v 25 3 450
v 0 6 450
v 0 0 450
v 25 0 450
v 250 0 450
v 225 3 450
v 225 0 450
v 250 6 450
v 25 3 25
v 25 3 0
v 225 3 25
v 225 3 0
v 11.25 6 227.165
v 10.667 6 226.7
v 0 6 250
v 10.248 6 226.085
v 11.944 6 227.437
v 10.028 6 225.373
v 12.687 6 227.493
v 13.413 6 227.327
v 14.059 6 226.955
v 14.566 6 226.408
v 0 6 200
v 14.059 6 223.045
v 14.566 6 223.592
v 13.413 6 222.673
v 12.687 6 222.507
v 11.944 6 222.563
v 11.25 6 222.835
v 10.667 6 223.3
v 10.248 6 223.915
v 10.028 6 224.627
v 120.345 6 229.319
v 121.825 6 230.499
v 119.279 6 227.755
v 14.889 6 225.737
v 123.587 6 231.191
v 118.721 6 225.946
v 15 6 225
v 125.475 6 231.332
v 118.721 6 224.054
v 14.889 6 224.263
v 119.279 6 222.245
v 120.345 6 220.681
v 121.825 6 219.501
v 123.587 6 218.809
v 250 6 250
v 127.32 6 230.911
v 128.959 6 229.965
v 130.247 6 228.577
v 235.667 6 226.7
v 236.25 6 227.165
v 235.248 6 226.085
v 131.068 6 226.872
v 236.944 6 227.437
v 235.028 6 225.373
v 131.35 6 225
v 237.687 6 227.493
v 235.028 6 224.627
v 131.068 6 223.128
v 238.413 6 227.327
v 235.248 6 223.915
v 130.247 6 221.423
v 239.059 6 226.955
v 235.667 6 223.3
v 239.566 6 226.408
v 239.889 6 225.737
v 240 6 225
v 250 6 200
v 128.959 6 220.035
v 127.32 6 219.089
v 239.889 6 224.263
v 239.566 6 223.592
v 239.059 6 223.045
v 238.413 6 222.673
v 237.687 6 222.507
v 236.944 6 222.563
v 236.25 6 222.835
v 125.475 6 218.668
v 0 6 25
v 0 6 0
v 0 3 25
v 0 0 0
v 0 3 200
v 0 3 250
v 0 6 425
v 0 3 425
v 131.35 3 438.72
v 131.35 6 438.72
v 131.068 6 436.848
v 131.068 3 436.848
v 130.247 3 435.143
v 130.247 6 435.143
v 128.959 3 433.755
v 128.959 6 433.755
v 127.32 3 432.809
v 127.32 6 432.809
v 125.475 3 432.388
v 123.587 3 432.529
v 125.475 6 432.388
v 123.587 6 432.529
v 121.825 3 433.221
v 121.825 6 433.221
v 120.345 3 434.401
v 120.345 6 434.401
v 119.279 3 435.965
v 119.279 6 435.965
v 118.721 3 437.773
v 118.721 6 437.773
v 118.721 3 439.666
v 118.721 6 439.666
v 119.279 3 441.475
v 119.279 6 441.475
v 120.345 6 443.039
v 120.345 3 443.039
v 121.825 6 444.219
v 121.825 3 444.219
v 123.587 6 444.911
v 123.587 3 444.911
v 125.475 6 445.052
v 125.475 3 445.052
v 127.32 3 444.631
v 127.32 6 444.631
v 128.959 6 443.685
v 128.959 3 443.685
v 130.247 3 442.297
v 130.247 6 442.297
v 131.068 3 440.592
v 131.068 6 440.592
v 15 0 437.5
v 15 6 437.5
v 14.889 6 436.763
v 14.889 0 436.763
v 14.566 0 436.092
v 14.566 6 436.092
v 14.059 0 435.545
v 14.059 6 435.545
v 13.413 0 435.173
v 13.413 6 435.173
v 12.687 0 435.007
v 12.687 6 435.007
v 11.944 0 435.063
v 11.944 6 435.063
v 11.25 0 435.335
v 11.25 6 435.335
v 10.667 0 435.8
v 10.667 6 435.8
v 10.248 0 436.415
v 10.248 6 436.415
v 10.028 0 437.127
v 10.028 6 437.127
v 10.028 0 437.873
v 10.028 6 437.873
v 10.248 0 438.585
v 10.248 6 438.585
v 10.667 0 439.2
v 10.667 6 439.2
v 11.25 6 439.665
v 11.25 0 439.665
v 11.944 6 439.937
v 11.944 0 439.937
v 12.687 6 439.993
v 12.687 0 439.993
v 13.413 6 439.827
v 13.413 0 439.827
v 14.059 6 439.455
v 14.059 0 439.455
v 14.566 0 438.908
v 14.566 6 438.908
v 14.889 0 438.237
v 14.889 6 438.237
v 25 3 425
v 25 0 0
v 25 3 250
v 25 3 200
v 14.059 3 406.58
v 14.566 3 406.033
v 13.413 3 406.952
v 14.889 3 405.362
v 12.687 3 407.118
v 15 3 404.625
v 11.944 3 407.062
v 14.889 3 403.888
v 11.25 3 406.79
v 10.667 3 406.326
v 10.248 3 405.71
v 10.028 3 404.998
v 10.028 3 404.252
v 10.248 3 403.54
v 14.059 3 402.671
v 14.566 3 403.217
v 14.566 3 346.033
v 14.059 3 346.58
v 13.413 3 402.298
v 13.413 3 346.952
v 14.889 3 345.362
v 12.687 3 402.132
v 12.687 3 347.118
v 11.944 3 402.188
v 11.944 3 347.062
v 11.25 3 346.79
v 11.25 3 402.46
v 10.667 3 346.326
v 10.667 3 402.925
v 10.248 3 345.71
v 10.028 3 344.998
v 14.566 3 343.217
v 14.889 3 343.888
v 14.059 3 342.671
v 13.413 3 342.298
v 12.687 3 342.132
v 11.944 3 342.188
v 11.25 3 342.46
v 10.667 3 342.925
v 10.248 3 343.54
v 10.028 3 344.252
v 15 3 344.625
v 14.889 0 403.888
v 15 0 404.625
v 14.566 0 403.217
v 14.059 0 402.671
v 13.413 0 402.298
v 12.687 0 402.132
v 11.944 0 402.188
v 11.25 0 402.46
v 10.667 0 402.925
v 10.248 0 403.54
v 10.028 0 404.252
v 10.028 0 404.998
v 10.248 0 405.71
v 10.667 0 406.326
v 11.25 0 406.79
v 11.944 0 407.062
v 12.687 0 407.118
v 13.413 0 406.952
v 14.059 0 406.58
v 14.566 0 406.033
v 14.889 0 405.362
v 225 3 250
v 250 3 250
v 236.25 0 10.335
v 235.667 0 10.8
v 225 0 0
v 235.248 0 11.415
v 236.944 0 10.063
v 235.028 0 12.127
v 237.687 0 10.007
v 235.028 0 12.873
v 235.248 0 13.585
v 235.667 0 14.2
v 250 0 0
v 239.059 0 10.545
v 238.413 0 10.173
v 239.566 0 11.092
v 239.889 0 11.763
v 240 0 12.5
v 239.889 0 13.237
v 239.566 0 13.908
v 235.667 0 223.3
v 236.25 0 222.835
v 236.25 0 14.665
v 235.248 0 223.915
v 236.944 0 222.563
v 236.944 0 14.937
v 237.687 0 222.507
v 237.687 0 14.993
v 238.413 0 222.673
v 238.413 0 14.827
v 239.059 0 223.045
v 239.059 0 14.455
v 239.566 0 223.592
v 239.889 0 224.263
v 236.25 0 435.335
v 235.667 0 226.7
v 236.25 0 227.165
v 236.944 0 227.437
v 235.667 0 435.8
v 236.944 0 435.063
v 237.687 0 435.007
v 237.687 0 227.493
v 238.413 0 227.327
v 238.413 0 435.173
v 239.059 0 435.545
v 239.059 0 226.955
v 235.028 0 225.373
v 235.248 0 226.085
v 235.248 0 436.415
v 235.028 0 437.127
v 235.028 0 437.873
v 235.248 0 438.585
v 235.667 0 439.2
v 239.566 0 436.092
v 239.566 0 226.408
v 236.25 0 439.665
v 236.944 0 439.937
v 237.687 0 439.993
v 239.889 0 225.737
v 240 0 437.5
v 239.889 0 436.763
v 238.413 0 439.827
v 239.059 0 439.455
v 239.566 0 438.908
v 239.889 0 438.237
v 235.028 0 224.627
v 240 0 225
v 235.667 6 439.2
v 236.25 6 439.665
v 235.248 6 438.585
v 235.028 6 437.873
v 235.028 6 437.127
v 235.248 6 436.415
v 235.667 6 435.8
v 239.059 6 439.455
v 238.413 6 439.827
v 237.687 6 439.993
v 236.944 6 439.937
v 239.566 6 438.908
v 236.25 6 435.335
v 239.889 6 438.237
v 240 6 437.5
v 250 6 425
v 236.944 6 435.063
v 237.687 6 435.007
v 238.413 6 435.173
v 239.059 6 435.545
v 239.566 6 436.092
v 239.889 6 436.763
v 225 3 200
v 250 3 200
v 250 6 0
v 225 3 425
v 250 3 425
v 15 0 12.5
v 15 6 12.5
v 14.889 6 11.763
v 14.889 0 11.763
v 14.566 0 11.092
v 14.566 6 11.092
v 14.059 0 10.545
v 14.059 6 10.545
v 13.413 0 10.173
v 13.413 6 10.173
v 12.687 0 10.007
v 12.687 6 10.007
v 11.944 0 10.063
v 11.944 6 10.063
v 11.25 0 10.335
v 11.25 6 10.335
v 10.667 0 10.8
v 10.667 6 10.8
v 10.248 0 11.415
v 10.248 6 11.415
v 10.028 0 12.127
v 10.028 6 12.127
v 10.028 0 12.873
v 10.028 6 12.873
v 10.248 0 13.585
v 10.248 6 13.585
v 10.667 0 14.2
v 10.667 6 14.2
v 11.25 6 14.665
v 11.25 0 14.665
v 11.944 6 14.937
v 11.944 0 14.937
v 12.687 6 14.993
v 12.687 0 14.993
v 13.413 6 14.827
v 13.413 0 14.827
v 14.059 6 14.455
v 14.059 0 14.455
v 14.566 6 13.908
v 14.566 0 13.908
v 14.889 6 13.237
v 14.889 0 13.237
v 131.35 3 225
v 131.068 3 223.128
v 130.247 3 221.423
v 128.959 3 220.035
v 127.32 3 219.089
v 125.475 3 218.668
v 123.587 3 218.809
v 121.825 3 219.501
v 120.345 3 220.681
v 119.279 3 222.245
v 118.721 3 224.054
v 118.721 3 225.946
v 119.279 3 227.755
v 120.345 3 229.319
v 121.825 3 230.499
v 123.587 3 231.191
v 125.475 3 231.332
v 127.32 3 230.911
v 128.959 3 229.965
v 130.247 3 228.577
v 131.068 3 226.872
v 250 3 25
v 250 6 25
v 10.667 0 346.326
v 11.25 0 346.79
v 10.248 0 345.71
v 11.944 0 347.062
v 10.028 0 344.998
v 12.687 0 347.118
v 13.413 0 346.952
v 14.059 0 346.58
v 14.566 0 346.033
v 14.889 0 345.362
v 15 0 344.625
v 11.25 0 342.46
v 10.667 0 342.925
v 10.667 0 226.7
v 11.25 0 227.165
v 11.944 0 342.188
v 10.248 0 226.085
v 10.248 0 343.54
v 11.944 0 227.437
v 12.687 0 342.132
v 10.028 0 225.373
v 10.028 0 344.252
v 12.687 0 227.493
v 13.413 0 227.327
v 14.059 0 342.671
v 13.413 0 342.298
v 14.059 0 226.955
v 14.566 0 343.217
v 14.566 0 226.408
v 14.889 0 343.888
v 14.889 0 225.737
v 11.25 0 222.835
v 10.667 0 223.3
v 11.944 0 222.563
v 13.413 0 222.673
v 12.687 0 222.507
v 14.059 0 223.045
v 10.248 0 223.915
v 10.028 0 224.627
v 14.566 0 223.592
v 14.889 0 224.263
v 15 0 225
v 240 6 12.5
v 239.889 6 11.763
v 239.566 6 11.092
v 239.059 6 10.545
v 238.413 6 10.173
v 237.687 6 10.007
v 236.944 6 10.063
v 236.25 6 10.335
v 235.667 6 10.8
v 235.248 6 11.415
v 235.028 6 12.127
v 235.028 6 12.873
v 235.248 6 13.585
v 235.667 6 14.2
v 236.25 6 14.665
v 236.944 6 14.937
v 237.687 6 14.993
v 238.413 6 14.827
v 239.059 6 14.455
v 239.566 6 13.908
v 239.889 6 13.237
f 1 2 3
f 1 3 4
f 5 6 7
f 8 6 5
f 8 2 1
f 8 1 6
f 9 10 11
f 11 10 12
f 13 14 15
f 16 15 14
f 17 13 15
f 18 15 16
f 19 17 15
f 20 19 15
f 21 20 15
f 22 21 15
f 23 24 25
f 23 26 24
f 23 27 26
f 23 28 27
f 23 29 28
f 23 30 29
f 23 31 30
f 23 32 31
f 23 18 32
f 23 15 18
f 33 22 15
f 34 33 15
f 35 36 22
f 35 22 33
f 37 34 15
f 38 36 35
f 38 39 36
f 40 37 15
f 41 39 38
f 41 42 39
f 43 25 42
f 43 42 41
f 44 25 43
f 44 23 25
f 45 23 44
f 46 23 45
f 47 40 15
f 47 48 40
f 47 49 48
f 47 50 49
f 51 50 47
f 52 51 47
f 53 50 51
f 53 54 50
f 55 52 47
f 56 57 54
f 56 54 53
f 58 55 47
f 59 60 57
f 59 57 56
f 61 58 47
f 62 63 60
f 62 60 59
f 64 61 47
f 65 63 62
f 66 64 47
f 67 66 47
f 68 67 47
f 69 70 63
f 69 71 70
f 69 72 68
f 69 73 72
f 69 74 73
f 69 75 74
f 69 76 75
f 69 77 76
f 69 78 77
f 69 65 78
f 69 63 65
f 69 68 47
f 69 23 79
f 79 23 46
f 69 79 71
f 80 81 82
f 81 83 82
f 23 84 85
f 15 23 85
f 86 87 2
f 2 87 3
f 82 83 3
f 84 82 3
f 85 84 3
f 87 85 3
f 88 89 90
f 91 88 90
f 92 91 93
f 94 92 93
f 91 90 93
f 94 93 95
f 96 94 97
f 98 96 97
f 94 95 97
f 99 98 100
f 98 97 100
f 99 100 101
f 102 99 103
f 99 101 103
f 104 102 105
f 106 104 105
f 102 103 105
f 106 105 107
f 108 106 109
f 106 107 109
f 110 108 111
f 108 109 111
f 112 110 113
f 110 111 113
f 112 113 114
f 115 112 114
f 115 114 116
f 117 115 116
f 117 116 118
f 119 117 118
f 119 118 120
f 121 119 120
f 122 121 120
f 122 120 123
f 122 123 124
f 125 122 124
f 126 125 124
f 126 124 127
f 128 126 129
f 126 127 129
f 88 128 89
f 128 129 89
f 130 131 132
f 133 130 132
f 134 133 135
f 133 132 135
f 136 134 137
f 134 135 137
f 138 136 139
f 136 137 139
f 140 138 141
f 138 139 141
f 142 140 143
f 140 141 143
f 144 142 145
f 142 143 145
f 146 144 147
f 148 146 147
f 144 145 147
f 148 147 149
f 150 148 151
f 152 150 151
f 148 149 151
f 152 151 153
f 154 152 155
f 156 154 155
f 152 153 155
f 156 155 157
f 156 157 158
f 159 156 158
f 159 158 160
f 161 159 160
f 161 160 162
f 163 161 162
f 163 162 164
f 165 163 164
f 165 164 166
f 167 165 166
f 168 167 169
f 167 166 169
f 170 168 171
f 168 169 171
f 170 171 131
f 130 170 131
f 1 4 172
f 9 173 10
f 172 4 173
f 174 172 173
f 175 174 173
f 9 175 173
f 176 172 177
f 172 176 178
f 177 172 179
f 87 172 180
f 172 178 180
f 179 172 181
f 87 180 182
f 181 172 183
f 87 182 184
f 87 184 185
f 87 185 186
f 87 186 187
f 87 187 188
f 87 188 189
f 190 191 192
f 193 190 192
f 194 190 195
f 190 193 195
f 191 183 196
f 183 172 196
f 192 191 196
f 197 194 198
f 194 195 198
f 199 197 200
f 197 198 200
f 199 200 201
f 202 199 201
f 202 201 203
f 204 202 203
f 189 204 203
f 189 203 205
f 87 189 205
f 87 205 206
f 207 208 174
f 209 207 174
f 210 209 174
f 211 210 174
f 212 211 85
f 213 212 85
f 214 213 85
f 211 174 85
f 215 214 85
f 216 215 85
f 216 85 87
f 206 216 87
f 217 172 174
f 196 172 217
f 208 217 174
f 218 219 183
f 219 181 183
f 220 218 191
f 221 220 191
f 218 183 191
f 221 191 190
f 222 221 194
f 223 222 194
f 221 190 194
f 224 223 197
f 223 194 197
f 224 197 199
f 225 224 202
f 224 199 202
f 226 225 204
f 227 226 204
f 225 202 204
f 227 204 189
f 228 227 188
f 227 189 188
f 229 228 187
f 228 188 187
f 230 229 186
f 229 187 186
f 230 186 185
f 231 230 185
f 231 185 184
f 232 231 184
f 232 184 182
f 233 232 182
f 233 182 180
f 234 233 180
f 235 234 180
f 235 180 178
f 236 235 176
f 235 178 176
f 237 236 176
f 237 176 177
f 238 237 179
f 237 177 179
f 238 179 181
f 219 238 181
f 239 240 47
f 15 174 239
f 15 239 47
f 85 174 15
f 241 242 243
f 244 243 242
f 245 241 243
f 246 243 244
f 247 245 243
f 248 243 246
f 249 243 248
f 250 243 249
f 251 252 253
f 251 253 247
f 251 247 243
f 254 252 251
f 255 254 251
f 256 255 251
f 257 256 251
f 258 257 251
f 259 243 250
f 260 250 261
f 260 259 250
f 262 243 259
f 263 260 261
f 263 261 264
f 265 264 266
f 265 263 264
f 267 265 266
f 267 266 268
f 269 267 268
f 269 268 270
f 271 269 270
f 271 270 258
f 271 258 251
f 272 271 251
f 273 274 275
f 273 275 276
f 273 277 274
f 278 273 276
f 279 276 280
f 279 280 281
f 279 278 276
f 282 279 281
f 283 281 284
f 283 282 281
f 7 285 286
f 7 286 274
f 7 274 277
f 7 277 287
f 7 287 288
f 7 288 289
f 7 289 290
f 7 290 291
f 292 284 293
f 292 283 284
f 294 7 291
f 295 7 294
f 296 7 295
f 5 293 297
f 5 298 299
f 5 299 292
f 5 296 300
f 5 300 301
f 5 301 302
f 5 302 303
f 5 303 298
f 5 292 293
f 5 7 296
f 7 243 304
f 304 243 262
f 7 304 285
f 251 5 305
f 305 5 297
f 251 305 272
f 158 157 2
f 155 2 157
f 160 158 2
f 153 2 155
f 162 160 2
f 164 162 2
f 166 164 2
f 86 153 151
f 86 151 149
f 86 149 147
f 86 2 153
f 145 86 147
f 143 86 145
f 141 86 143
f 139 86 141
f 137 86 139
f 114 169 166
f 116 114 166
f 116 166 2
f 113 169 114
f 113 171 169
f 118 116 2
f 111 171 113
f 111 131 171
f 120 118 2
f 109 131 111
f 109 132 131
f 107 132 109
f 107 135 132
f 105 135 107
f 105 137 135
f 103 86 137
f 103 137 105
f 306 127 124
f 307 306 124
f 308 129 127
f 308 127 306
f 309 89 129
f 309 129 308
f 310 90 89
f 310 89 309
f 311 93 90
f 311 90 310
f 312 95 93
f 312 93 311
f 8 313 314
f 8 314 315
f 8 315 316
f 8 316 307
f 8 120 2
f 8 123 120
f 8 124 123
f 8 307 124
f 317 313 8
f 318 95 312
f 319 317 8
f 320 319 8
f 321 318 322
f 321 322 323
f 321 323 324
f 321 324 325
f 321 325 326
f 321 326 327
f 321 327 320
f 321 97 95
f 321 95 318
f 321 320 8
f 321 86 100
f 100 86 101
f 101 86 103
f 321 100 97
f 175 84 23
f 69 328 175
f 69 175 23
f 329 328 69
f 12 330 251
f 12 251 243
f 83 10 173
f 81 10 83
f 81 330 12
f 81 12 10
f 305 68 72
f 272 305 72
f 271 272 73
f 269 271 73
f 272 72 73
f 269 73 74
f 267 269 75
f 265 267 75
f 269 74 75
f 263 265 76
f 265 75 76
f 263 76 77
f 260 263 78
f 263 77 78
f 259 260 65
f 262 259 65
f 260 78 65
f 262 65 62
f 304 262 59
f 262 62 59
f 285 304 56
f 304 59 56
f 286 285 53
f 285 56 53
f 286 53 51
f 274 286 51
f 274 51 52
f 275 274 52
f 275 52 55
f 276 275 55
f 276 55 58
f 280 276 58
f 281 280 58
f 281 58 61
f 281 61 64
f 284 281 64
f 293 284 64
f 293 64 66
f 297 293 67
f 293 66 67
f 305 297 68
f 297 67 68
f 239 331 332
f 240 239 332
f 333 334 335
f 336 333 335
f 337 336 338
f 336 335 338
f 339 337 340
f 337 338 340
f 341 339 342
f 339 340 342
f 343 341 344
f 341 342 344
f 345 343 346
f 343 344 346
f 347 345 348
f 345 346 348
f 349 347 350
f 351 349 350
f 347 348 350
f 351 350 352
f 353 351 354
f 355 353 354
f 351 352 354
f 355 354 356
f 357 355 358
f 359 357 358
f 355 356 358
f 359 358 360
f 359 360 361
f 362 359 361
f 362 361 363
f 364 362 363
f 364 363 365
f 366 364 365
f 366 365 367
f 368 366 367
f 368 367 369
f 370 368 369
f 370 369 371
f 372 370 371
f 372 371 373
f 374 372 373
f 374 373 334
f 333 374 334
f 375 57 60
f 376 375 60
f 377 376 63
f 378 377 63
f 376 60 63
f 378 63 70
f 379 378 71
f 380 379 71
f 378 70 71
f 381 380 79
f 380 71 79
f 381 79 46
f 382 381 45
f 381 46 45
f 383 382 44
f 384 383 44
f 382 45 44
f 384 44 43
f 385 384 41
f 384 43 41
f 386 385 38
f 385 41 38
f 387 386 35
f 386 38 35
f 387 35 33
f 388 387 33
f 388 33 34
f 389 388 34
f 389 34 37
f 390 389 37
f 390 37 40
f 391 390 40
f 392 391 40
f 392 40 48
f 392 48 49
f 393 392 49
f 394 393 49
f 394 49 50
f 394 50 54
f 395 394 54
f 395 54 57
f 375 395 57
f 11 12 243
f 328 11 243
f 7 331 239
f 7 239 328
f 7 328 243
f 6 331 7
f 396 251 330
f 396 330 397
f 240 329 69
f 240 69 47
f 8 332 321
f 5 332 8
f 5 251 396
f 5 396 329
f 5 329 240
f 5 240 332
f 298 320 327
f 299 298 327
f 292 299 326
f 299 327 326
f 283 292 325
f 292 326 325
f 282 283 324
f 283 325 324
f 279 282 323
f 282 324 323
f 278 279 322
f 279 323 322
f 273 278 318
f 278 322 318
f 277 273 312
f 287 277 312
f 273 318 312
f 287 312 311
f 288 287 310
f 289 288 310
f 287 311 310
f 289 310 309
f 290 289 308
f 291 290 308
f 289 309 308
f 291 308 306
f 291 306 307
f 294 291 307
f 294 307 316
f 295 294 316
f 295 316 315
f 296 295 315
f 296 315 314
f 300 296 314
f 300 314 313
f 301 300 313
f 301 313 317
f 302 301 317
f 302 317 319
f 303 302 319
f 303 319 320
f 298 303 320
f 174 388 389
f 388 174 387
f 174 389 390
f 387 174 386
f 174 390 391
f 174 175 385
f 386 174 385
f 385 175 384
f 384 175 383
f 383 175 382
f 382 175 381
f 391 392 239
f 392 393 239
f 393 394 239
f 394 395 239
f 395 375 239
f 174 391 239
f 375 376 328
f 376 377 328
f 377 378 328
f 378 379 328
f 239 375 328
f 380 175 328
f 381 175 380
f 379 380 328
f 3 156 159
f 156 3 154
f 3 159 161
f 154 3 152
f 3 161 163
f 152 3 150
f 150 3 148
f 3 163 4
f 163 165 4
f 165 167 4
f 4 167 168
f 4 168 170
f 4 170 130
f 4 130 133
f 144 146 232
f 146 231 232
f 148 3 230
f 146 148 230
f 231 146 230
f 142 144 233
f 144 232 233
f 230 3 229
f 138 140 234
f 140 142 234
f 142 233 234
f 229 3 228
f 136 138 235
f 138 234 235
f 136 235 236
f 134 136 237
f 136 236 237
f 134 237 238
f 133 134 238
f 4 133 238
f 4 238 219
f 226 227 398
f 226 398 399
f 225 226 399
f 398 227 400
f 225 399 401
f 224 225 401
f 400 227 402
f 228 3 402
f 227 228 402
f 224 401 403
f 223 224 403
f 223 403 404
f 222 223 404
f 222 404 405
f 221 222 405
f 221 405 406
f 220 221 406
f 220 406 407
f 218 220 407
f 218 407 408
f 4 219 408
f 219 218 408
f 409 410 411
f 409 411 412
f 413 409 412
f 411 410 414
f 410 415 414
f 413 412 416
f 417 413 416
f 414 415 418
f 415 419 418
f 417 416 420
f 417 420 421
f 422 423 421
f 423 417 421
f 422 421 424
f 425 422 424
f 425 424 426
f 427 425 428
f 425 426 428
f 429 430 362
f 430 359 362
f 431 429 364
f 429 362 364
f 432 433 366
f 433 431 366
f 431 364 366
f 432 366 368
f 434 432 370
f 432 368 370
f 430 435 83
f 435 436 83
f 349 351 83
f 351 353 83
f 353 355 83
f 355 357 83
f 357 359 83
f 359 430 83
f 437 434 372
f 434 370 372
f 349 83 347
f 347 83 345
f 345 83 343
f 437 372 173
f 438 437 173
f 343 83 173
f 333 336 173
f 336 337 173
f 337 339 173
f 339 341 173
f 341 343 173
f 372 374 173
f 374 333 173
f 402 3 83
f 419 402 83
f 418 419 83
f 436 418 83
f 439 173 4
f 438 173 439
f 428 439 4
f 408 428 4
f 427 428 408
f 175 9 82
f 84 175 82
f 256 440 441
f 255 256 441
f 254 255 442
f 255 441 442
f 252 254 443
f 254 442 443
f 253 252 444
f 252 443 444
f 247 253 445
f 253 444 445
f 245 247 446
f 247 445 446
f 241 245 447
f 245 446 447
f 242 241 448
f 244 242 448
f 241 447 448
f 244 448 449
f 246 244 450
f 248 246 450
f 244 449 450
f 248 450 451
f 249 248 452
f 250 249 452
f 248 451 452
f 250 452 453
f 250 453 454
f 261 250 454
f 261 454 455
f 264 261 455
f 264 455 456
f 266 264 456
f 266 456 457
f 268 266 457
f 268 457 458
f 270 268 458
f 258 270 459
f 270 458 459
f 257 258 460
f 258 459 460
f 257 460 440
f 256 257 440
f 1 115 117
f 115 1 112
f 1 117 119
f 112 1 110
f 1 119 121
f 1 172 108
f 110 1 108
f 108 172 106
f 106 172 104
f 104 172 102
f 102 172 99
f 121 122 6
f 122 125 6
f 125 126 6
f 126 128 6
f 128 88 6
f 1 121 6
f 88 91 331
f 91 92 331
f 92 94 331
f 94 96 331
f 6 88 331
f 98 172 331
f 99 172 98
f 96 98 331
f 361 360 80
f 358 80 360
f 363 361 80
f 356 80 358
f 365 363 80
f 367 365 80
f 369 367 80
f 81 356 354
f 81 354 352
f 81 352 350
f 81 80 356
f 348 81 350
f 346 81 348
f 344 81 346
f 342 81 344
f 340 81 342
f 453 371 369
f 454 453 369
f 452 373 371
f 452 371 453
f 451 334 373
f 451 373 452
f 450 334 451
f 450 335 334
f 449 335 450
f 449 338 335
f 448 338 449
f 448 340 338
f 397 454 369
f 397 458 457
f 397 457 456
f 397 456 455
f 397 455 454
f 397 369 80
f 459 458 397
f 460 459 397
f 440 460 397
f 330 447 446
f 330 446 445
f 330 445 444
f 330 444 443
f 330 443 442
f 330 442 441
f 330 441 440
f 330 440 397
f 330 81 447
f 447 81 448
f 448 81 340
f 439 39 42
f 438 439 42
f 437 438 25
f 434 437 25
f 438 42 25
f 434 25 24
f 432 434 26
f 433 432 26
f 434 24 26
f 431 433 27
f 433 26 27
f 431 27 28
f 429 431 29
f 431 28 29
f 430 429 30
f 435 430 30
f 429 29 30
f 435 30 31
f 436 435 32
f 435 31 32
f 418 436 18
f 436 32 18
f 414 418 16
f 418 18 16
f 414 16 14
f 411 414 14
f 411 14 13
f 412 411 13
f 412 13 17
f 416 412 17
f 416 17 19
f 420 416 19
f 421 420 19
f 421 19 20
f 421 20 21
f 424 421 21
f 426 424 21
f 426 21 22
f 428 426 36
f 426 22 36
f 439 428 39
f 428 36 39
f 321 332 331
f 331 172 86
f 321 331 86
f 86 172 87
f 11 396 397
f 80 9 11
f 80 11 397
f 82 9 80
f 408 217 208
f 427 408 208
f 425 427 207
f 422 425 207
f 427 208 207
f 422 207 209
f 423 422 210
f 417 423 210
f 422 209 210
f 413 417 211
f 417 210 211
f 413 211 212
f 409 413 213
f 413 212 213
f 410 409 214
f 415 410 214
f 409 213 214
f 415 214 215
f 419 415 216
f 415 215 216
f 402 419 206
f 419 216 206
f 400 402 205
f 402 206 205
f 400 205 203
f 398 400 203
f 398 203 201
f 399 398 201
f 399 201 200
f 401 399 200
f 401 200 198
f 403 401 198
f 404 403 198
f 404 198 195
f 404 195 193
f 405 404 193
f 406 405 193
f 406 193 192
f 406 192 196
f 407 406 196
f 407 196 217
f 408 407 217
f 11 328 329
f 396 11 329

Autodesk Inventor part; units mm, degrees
ref_plane "YZ Plane" through (0, 0, 0) normal (1, 0, 0) x (0, 1, 0)
ref_plane "XZ Plane" through (0, 0, 0) normal (0, 1, 0) x (-1, 0, 0)
ref_plane "XY Plane" through (0, 0, 0) normal (0, 0, 1) x (1, 0, 0)
sketch "Sketch1" plane through (0, 0, 0) normal (0, 0, 1) x (1, 0, 0)
  line L0 (0, 0) -> (25, 0)
  line L1 (25, 0) -> (25, 3)
  line L2 (25, 3) -> (0, 3)
  line L3 (0, 3) -> (0, 0)
  dimension "d0" = 25
  dimension "d1" = 3
extrude "Extrusion1" add sketch "Sketch1" along normal blind 450
sketch "Sketch2" plane through (0, 3, 0) normal (0, 1, 0) x (1, 0, 0)
  line L0 (0, 0) -> (0, -450) projected
  line L1 (0, 0) -> (250, 0)
  line L2 (250, 0) -> (250, -25)
  line L3 (250, -25) -> (0, -25)
  line L4 (0, -25) -> (0, 0)
  dimension "d4" = 250
  dimension "d5" = 25
extrude "Extrusion2" add sketch "Sketch2" along normal blind 3
sketch "Sketch3" plane through (0, 3, 450) normal (0, 1, 0) x (1, 0, 0)
  line L0 (0, 450) -> (0, 0) projected
  line L1 (0, 0) -> (250, 0)
  line L2 (250, 0) -> (250, 25)
  line L3 (250, 25) -> (0, 25)
  line L4 (0, 25) -> (0, 0)
  dimension "d8" = 250
  dimension "d9" = 25
extrude "Extrusion3" add sketch "Sketch3" along normal blind 3
sketch "Sketch4" plane through (0, 3, 0) normal (0, -1, 0) x (1, 0, 0)
  line L0 (250, 0) -> (0, 0) projected
  line L1 (250, 0) -> (225, 0)
  line L2 (225, 0) -> (225, 450)
  line L3 (225, 450) -> (250, 450)
  line L4 (250, 450) -> (250, 0)
  dimension "d12" = 25
  dimension "d13" = 450
extrude "Extrusion4" add sketch "Sketch4" along normal blind 3
sketch "Sketch5" plane through (0, 3, 25) normal (0, 1, 0) x (1, 0, 0)
  line L0 (0, 25) -> (0, -175)
  line L1 (0, 0) -> (0, -400) projected
  line L2 (0, -175) -> (250, -175)
  line L3 (250, -175) -> (250, -225)
  line L4 (250, -225) -> (0, -225)
  line L5 (0, -225) -> (0, -175)
  dimension "d16" = 200
  dimension "d17" = 250
  dimension "d18" = 50
extrude "Extrusion5" add sketch "Sketch5" along normal blind 3
sketch "Sketch6" plane through (0, 6, 0) normal (0, 1, 0) x (1, 0, 0)
  line L0 (25, -25) -> (0, -25) projected
  line L1 (0, 0) -> (0, -25) projected
  line L2 (25, -25) -> (0, -25)
  line L3 (0, -25) -> (0, 0)
  line L4 (0, 0) -> (25, 0)
  line L5 (25, 0) -> (25, -25)
  line L6 (25, -25) -> (0, 0)
  line L7 (225, 0) -> (25, 0) projected
  line L8 (25, 0) -> (0, -25)
  circle A0 centre (12.5, -12.5) radius 2.5
  line L9 (0, -450) -> (250, -450) projected
  line L10 (250, -425) -> (0, -425) projected
  line L11 (0, -450) -> (25, -450)
  line L12 (25, -450) -> (25, -425)
  line L13 (25, -425) -> (0, -425)
  line L14 (0, -425) -> (0, -450)
  line L15 (250, -450) -> (225, -450)
  line L16 (225, -450) -> (225, -425)
  line L17 (225, -425) -> (250, -425)
  line L18 (250, -425) -> (250, -450)
  line L19 (0, -450) -> (25, -425)
  line L20 (25, -450) -> (0, -425)
  line L21 (250, -450) -> (225, -425)
  line L22 (225, -425) -> (225, -250) projected
  line L23 (225, -450) -> (250, -425)
  circle A1 centre (237.5, -437.5) radius 2.5
  circle A2 centre (12.5, -437.5) radius 2.5
  line L24 (250, -25) -> (250, 0) projected
  line L25 (225, -25) -> (250, -25) projected
  line L26 (250, 0) -> (225, 0)
  line L27 (225, 0) -> (225, -25)
  line L28 (225, -25) -> (250, -25)
  line L29 (250, -25) -> (250, 0)
  line L30 (250, -25) -> (225, 0)
  line L31 (225, 0) -> (225, -25) projected
  line L32 (225, 0) -> (225, -25)
  line L33 (225, -25) -> (250, 0)
  circle A3 centre (237.5, -12.5) radius 2.5
  dimension "d21" = 5
  dimension "d22" = 5
  dimension "d23" = 5
  dimension "d24" = 5
extrude "Extrusion6" cut sketch "Sketch6" against normal blind 100 contours A0 L8 L6 | L6 L8 A0 | A0 L6 L8 | L8 L6 A0 | A3 L33 L30 | L30 L33 A3 | A3 L30 L33 | L33 L30 A3 | A2 L20 L19 | L19 L20 A2 | L20 L19 A2 | A2 L19 L20 | A1 L21 L23 | L23 L21 A1 | L21 L23 A1 | A1 L23 L21
sketch "Sketch7" plane through (0, 6, 25) normal (0, 1, 0) x (1, 0, 0)
  circle A0 centre (12.5, -200) radius 2.5
  line L0 (0, -175) -> (0, -225) projected
  line L1 (0, -225) -> (250, -225) projected
  circle A1 centre (237.5, -200) radius 2.5
  line L2 (250, -225) -> (250, -175) projected
  line L3 (250, -175) -> (0, -175) projected
  point P0 (0, 25)
  dimension "d27" = 5
  dimension "d28" = 12.5
  dimension "d29" = 25
  dimension "d30" = 5
  dimension "d31" = 12.5
  dimension "d32" = 25
extrude "Extrusion7" cut sketch "Sketch7" against normal blind 100 contours A0 | A1
thread "Thread1" size "M5x0.8" class "6H" standard "ANSI Metric M Profile" full length
thread "Thread2" size "M5x0.8" class "6H" standard "ANSI Metric M Profile" full length
thread "Thread3" size "M5x0.8" class "6H" standard "ANSI Metric M Profile" full length
thread "Thread4" size "M5x0.8" class "6H" standard "ANSI Metric M Profile" full length
thread "Thread5" size "M5x0.8" class "6H" standard "ANSI Metric M Profile" full length
thread "Thread6" size "M5x0.8" class "6H" standard "ANSI Metric M Profile" full length
sketch "Sketch8" plane through (0, 6, 25) normal (0, 1, 0) x (1, 0, 0)
  circle A0 centre (12.5, -200) radius 2.5 projected
  circle A1 centre (237.5, -200) radius 2.5 projected
  circle A2 centre (125, -200) radius 6.35
  line L0 (250, -225) -> (250, -175) projected
  point P0 (0, 25)
  dimension "d47" = 12.7
  dimension "d48" = 125
extrude "Extrusion8" cut sketch "Sketch8" against normal blind 10 contours A2
sketch "Sketch9" plane through (0, 6, 450) normal (0, 1, 0) x (1, 0, 0)
  circle A0 centre (125, 11.2801) radius 6.35
  line L0 (250, 0) -> (250, 25) projected
  point P0 (0, 450)
  dimension "d51" = 12.7
  dimension "d52" = 125
extrude "Extrusion9" cut sketch "Sketch9" against normal through all
thread "Thread7" size "M14x2" class "6H" standard "ANSI Metric M Profile" full length
sketch "Sketch10" plane through (0, 3, 425) normal (0, 1, 0) x (1, 0, 0)
  line L0 (25, 425) -> (25, -25) projected
  line L1 (0, 425) -> (0, -25) projected
  line L2 (25, 0.3749) -> (0, 0.3749)
  line L3 (0, 0.3749) -> (0, 100.3749)
  line L4 (0, 100.3749) -> (25, 100.3749)
  line L5 (25, 100.3749) -> (25, 0.3749)
  circle A0 centre (12.5, 20.3749) radius 2.5
  circle A1 centre (12.5, 80.3749) radius 2.5
  point P0 (12.5, 0.3749)
  point P1 (12.5, 100.3749)
  dimension "d57" = 100
  dimension "d58" = 5
  dimension "d59" = 5
  dimension "d60" = 20
  dimension "d61" = 20
  dimension "d62" = 12.5
  dimension "d63" = 12.5
extrude "Extrusion10" cut sketch "Sketch10" against normal blind 10 contours A0 | A1
thread "Thread8" size "M5x0.8" class "6H" standard "ANSI Metric M Profile" full length
thread "Thread9" size "M5x0.8" class "6H" standard "ANSI Metric M Profile" full length
properties part number "Base Platform"
